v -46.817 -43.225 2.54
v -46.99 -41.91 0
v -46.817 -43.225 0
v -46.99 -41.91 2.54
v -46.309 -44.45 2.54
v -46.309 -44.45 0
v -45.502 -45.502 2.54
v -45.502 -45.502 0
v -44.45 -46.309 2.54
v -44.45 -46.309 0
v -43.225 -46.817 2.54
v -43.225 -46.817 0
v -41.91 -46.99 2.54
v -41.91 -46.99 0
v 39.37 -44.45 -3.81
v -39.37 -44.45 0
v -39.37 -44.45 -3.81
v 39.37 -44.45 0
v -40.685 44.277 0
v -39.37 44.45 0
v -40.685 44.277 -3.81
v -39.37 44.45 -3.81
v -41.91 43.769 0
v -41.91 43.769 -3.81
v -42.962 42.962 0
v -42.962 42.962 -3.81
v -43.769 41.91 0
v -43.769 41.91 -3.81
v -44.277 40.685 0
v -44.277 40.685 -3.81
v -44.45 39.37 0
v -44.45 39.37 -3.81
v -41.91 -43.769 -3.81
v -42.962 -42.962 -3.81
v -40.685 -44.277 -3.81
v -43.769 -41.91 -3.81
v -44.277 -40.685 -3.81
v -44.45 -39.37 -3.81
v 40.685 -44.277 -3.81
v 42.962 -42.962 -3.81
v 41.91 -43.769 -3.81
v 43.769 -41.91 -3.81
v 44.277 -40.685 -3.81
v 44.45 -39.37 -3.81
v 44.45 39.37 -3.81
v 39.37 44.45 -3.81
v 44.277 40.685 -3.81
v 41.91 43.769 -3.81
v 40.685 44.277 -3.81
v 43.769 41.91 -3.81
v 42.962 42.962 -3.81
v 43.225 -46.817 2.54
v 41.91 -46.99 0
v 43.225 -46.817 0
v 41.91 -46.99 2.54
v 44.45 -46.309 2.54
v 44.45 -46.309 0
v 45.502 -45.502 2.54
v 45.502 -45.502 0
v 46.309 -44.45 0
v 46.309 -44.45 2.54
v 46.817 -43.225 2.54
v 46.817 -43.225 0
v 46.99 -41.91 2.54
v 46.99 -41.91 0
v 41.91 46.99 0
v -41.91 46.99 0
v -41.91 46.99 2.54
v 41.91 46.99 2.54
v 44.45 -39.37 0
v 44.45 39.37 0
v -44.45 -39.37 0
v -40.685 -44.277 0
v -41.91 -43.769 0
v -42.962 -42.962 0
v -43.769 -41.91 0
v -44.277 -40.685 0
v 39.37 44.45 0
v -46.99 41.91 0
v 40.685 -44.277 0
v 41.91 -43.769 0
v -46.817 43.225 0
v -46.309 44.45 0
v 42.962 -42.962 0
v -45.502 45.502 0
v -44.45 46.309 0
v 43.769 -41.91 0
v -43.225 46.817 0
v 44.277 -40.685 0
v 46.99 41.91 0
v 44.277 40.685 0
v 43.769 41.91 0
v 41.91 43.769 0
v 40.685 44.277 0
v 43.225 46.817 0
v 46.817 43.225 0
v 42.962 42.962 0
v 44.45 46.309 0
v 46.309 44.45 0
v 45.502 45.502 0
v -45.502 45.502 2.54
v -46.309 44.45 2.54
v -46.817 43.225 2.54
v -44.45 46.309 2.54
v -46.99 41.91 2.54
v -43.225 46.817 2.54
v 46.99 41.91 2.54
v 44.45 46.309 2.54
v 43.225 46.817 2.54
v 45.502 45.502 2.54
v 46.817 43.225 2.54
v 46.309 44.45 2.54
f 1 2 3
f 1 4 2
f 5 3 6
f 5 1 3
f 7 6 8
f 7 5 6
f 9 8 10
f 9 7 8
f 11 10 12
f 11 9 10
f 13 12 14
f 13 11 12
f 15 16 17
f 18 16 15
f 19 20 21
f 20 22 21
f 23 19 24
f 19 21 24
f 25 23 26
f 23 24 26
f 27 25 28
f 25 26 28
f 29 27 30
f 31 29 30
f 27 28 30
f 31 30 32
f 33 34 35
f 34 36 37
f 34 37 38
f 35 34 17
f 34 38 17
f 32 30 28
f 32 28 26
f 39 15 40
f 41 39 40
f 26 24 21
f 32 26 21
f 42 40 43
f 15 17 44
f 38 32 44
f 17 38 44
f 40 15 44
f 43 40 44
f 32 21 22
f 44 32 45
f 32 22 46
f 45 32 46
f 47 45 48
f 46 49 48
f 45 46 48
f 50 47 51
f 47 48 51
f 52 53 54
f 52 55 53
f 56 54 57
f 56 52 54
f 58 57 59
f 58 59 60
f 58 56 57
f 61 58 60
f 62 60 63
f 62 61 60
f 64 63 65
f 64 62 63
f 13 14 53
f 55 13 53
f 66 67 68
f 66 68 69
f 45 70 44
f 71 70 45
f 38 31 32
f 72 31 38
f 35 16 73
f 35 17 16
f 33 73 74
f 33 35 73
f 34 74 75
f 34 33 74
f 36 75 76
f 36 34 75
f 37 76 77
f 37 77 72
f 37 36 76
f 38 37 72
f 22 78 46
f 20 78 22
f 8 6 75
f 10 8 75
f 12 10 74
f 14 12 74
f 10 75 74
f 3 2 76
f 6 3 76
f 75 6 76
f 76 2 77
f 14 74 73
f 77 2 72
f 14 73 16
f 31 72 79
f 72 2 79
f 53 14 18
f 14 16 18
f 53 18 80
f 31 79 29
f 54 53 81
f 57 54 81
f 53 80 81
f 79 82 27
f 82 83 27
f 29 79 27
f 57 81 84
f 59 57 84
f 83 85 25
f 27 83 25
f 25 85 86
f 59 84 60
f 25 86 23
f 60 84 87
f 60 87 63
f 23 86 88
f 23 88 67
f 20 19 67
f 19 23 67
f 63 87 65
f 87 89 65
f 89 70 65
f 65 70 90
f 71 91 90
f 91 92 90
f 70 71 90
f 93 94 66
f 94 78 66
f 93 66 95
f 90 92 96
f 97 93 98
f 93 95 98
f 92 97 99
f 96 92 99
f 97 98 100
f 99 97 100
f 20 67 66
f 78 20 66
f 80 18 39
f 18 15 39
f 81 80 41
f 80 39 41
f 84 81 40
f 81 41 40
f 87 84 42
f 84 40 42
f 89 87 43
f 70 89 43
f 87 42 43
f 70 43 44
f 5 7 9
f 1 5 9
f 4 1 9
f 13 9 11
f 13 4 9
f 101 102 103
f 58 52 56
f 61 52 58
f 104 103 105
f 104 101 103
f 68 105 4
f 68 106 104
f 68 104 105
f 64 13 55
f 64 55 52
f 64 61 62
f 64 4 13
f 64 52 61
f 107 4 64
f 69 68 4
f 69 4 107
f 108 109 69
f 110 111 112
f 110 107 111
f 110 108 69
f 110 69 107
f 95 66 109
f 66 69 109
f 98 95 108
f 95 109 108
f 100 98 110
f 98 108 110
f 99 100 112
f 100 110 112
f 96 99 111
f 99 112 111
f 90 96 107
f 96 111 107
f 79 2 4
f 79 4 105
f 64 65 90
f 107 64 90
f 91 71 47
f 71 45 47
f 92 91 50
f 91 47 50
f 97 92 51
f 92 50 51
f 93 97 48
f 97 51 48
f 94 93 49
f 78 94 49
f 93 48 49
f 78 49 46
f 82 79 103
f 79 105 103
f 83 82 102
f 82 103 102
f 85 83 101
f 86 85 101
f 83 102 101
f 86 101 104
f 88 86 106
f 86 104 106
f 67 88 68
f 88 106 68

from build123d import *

# Parameters (mm, degrees)
F0_W     = 93.98
F0_H     = 93.98
F1_DEPTH = 2.54
F3_DEPTH = 3.81
F4_R     = 5.08


with BuildPart() as f1:
    # F0 (on Top) → F1 (new body)
    with BuildSketch(Plane.XY):
        Rectangle(F0_W, F0_H)
    extrude(amount=F1_DEPTH)

    # F2 (on Top) → F3 (join)
    with BuildSketch(Plane.XY):
        Polygon((-44.45, -44.45), (0, -44.45), (44.45, -44.45), (44.45, 44.45), (-44.45, 44.45), align=None)
    extrude(amount=-F3_DEPTH)

    # F4
    f4_edges = [f1.edges().sort_by_distance(p)[0] for p in [
        (44.45, -44.45, -1.905),
        (-44.45, -44.45, -1.905),
        (-44.45, 44.45, -1.905),
        (44.45, 44.45, -1.905),
        (-46.99, -46.99, 1.27),
        (46.99, -46.99, 1.27),
        (46.99, 46.99, 1.27),
        (-46.99, 46.99, 1.27),
    ]]
    fillet(f4_edges, radius=F4_R)


solid = f1.part
